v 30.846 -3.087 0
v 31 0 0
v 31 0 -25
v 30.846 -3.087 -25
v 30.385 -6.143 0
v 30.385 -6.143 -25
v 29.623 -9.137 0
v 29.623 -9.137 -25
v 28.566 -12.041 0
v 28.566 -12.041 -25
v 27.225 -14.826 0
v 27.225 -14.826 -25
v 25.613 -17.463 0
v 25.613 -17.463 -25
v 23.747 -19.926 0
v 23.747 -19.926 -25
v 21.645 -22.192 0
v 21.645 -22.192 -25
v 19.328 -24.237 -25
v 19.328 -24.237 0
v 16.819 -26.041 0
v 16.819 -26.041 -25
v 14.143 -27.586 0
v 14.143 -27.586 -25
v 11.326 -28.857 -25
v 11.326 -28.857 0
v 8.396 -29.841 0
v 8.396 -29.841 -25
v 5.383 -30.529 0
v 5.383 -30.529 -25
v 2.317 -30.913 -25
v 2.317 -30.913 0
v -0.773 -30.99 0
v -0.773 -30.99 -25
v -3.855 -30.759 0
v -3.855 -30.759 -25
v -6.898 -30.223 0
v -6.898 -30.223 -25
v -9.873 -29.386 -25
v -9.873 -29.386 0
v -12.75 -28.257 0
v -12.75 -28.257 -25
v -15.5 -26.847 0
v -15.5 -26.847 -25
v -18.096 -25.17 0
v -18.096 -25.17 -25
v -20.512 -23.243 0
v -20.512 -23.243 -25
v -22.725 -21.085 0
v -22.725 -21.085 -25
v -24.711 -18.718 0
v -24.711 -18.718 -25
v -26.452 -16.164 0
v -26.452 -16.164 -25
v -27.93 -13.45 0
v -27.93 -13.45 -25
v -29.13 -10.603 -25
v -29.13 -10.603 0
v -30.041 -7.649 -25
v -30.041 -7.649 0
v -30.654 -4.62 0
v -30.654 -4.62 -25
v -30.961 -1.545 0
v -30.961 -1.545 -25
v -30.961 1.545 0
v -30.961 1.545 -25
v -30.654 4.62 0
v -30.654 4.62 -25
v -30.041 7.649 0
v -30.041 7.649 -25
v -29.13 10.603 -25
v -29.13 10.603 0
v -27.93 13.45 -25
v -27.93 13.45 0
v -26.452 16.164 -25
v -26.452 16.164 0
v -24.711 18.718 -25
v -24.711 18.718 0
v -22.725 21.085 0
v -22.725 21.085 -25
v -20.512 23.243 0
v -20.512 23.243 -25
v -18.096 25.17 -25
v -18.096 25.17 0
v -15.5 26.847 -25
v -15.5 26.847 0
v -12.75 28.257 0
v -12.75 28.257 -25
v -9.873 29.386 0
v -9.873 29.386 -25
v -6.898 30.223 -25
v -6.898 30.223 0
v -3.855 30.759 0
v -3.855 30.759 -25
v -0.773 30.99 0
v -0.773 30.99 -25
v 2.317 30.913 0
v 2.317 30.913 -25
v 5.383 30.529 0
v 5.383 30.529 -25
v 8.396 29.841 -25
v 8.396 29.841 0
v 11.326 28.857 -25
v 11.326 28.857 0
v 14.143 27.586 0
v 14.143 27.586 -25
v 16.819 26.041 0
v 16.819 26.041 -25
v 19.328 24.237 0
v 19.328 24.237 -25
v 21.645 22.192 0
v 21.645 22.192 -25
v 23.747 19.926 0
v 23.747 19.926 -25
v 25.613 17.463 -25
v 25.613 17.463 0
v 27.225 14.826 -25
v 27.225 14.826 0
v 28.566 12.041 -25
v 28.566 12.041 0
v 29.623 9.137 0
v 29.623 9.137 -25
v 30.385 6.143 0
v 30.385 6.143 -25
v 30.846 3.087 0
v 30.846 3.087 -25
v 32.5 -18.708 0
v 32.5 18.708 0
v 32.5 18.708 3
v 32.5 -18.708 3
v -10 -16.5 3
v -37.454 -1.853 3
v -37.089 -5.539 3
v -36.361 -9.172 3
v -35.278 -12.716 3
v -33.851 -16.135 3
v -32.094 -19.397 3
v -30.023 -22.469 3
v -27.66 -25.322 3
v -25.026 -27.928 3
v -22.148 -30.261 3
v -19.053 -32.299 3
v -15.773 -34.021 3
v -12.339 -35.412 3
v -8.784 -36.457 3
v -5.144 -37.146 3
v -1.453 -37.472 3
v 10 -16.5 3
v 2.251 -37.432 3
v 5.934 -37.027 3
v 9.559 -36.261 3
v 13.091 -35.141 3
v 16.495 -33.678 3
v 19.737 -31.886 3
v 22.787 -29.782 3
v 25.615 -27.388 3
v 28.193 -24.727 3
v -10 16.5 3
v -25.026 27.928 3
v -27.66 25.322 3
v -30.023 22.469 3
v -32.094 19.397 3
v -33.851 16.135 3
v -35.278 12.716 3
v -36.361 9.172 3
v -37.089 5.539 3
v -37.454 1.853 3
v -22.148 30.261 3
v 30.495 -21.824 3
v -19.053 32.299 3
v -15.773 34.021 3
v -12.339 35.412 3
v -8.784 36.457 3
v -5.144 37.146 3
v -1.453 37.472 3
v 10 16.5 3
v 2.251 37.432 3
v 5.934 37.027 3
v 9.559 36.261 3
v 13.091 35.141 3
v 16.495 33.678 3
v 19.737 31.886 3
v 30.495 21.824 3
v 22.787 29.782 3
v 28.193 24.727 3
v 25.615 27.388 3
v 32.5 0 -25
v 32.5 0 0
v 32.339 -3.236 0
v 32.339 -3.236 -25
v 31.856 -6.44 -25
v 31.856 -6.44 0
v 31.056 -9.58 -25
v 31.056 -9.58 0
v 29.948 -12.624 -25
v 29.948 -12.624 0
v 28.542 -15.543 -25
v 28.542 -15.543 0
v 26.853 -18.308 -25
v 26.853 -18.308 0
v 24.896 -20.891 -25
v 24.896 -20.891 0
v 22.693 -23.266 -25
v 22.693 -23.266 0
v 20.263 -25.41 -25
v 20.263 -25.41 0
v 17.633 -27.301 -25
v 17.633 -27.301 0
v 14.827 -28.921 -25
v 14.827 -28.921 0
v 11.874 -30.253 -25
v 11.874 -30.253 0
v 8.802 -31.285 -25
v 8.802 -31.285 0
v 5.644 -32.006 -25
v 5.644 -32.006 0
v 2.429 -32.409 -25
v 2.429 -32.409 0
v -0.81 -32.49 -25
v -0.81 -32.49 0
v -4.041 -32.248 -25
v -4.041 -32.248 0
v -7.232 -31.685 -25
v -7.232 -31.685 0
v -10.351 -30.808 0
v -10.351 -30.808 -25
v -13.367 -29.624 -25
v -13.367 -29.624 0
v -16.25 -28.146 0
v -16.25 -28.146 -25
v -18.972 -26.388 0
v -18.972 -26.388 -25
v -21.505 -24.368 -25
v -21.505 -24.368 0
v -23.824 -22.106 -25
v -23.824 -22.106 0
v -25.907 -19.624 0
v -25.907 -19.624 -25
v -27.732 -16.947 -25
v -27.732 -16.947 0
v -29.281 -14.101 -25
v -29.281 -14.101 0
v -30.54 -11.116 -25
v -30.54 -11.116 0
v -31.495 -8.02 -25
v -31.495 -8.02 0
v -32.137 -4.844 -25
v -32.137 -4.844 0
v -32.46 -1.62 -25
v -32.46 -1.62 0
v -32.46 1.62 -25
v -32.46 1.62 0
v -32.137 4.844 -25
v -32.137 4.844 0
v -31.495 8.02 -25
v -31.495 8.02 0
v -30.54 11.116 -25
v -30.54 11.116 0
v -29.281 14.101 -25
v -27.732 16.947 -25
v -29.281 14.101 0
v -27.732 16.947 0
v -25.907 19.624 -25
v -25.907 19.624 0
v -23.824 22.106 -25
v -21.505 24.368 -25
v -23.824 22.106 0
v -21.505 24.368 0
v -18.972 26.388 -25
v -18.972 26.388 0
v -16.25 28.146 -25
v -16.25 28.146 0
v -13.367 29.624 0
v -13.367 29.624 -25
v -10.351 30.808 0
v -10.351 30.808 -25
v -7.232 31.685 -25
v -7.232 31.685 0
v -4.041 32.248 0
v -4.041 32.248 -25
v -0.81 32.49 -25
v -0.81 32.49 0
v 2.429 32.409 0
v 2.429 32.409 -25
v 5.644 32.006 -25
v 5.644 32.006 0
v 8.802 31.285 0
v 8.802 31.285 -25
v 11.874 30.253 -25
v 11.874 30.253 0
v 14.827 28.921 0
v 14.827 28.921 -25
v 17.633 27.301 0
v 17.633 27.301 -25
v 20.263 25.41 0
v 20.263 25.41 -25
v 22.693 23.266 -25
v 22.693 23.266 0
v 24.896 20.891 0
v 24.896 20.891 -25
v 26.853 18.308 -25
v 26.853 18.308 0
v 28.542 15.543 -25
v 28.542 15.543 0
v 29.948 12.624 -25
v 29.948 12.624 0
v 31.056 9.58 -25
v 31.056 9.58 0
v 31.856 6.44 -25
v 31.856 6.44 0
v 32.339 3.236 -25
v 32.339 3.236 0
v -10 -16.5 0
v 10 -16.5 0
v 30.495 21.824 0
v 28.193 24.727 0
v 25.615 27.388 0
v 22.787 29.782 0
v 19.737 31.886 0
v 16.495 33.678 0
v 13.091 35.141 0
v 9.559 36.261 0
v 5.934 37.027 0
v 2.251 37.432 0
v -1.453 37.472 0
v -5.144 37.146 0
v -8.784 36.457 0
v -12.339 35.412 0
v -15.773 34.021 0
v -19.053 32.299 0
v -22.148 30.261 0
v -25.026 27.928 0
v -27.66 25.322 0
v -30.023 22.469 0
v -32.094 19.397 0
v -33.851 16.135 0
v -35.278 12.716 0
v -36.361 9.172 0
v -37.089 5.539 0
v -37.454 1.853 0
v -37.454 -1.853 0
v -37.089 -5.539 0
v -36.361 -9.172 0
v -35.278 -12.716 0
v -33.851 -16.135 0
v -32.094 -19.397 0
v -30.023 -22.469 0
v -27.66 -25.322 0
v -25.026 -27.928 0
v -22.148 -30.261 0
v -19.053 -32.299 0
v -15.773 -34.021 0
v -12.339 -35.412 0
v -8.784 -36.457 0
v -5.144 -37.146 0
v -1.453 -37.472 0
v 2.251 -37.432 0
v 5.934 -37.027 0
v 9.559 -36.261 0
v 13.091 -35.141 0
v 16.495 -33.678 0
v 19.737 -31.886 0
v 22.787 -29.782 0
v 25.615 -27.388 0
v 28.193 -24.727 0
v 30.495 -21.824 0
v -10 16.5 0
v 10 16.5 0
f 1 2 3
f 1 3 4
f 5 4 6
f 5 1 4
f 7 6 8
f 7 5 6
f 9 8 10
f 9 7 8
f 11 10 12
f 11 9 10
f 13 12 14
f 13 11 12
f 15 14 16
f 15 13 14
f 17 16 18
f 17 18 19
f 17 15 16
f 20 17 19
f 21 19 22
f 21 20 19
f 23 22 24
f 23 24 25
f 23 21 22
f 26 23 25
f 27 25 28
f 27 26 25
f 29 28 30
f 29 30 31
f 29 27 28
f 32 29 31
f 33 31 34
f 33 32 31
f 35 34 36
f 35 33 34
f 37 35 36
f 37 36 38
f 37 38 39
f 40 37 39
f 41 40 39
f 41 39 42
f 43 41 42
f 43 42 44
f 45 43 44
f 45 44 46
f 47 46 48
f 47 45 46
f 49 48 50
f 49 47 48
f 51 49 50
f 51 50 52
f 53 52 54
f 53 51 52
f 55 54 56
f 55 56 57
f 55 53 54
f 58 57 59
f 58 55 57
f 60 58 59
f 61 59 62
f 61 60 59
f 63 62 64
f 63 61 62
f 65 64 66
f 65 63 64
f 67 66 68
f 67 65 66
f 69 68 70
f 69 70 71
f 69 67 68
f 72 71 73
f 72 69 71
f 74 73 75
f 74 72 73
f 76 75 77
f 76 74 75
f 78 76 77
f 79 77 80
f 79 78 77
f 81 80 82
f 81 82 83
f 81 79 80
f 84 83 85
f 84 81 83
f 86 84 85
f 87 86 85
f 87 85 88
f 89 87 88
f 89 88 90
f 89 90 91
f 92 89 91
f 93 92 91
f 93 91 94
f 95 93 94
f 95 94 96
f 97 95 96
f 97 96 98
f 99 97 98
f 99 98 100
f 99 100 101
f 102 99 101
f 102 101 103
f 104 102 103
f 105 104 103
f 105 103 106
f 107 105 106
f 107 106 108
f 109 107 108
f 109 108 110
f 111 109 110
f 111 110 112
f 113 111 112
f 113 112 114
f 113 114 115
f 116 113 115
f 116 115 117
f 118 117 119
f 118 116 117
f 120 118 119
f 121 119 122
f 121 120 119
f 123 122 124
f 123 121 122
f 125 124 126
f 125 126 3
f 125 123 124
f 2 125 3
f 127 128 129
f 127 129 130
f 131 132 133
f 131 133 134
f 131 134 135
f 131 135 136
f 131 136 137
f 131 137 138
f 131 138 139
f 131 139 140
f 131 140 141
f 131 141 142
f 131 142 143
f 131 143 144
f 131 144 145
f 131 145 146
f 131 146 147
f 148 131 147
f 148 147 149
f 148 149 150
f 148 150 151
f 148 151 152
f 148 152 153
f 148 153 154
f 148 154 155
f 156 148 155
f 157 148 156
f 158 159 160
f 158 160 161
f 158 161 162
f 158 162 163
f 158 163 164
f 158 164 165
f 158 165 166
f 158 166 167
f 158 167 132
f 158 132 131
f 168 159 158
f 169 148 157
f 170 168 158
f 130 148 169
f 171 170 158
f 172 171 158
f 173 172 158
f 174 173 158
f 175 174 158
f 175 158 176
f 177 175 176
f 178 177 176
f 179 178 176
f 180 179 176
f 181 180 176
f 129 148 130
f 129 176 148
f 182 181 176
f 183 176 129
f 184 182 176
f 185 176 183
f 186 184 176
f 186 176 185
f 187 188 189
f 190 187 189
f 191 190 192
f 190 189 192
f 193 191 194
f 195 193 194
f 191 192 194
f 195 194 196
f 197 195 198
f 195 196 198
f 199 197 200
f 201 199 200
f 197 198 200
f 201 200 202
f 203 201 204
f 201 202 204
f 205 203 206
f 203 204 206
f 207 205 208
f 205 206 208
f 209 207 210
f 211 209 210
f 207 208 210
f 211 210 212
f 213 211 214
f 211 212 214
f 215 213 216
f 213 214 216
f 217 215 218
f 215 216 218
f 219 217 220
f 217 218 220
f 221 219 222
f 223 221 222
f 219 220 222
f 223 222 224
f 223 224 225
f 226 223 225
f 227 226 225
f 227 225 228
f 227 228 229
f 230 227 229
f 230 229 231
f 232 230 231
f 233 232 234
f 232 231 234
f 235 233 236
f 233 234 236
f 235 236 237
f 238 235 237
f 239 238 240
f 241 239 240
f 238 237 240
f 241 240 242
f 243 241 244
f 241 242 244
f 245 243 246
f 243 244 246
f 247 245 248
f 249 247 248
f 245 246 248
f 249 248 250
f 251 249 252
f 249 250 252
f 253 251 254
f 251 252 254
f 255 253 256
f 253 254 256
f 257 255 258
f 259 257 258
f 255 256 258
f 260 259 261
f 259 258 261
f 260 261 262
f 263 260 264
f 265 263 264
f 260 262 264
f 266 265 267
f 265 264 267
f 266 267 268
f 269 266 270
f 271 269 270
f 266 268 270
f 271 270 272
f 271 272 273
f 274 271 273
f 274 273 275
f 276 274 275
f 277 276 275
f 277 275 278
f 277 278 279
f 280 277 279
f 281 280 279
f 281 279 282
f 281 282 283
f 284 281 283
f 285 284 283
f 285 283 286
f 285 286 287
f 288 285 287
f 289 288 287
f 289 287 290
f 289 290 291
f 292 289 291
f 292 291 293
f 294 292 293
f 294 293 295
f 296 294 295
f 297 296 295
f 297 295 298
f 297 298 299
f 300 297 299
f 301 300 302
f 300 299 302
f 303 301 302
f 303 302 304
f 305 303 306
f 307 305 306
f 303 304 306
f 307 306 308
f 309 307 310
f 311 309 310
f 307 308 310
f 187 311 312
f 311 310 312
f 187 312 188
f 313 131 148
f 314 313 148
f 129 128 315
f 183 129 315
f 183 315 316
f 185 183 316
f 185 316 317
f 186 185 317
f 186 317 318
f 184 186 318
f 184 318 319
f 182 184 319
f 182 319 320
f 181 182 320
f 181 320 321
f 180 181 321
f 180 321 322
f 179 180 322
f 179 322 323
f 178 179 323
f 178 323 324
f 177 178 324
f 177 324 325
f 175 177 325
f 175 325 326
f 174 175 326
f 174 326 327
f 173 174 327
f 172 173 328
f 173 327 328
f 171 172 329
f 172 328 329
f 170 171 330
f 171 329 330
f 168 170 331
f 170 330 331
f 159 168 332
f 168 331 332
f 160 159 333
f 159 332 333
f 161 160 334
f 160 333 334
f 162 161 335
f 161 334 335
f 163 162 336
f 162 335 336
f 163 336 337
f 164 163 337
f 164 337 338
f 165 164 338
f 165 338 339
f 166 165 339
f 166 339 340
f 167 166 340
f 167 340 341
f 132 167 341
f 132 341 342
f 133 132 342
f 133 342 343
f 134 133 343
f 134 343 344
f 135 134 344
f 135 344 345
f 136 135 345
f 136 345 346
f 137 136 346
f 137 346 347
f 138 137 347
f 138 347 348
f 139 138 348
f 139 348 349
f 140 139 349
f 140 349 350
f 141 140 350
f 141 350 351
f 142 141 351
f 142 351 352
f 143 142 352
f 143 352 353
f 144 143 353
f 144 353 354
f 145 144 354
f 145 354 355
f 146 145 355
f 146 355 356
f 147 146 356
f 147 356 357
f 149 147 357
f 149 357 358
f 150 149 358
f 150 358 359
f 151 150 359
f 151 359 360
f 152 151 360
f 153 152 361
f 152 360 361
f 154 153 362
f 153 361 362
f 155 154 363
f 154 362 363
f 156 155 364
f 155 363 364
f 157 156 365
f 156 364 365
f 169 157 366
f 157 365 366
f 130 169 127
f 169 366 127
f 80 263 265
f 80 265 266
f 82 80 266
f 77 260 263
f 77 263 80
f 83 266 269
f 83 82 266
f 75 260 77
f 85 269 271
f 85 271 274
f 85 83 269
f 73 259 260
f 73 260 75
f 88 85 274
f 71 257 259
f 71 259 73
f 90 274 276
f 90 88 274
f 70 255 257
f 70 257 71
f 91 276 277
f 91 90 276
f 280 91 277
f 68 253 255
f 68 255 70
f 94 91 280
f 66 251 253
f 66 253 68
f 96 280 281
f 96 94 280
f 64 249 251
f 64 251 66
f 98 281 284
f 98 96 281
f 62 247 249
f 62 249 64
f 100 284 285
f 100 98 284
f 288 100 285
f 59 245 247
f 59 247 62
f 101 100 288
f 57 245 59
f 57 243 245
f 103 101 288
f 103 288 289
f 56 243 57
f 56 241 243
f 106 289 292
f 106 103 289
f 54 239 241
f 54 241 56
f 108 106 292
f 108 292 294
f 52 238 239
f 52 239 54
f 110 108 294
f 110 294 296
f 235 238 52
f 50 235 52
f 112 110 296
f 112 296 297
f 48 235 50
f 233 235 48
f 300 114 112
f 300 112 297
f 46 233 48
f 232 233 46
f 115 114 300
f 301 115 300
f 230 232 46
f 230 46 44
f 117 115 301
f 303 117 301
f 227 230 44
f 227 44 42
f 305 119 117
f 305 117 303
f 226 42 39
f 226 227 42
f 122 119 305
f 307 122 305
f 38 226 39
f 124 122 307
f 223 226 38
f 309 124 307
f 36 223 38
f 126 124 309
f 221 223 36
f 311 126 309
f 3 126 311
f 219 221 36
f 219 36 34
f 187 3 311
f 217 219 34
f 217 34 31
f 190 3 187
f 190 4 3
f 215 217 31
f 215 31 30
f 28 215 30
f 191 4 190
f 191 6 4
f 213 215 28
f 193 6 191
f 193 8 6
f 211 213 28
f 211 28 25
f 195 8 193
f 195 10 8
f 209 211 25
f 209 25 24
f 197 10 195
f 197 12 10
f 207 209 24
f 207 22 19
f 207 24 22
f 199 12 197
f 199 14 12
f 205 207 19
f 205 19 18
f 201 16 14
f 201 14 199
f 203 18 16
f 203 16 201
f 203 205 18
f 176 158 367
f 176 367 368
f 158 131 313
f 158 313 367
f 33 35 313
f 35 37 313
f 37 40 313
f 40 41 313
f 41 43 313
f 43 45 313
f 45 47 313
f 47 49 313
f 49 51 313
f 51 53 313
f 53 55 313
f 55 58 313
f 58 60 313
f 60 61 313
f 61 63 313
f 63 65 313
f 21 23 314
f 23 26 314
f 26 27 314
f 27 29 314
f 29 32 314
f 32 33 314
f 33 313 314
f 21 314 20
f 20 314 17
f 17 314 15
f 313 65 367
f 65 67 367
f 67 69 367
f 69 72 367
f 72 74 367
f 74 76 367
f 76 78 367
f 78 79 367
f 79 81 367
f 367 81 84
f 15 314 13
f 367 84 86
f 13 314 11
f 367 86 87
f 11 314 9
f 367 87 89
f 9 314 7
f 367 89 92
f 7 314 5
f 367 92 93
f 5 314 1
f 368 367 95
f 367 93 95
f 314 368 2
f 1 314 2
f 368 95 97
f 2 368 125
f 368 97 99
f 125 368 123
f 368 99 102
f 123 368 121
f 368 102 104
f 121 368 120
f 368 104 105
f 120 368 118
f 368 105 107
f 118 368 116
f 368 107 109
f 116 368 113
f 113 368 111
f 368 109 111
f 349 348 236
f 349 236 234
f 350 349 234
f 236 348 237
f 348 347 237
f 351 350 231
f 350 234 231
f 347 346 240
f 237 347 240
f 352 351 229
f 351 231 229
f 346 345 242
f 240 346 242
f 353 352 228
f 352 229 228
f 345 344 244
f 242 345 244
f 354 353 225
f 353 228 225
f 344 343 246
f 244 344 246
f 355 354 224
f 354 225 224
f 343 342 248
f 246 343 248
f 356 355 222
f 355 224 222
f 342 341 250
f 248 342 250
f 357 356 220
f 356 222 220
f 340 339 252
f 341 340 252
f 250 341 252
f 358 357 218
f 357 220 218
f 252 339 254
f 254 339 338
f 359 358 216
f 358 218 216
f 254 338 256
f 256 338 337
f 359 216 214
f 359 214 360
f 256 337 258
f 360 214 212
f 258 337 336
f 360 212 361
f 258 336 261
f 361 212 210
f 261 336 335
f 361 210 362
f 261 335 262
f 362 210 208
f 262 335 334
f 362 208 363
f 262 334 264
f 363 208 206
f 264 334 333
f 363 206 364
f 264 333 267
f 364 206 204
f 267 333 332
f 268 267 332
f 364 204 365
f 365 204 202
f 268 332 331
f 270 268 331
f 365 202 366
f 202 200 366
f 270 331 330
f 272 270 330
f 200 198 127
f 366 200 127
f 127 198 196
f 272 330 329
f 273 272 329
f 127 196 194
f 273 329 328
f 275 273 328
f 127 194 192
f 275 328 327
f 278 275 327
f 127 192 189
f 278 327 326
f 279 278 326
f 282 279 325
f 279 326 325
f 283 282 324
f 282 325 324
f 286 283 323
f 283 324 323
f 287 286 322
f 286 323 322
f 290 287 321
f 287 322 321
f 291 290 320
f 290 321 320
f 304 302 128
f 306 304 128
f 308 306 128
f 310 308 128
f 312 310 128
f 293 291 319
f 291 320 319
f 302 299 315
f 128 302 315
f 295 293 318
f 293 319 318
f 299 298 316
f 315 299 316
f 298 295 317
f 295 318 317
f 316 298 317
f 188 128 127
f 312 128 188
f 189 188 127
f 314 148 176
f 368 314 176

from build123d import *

# Parameters (mm, degrees)
F0_R     = 37.5
F1_DEPTH = 3
F2_R     = 32.5
F2_R_2   = 31
F3_DEPTH = 25
F4_W     = 20
F4_H     = 33
F5_DEPTH = 25
F6_W     = 8.066451
F6_H     = 38.420005
F7_DEPTH = 25


with BuildPart() as f1:
    # F0 (on Top) → F1 (new body)
    with BuildSketch(Plane.XY):
        Circle(F0_R)
    extrude(amount=F1_DEPTH)

    # F2 (on face) → F3 (join)
    with BuildSketch(Plane(origin=(0, 0, 0), x_dir=(1, 0, 0), z_dir=(0, 0, -1))):
        Circle(F2_R)
        Circle(F2_R_2, mode=Mode.SUBTRACT)
    extrude(amount=F3_DEPTH)

    # F4 (on face) → F5 (cut)
    with BuildSketch(Plane.XY.offset(3)):
        Rectangle(F4_W, F4_H)
    extrude(amount=-F5_DEPTH, mode=Mode.SUBTRACT)

    # F6 (on face) → F7 (cut)
    with BuildSketch(Plane(origin=(0, 0, 0), x_dir=(1, 0, 0), z_dir=(0, 0, -1))):
        with Locations((36.533226, 0.501715)):
            Rectangle(F6_W, F6_H)
    extrude(amount=-F7_DEPTH, mode=Mode.SUBTRACT)


solid = f1.part
